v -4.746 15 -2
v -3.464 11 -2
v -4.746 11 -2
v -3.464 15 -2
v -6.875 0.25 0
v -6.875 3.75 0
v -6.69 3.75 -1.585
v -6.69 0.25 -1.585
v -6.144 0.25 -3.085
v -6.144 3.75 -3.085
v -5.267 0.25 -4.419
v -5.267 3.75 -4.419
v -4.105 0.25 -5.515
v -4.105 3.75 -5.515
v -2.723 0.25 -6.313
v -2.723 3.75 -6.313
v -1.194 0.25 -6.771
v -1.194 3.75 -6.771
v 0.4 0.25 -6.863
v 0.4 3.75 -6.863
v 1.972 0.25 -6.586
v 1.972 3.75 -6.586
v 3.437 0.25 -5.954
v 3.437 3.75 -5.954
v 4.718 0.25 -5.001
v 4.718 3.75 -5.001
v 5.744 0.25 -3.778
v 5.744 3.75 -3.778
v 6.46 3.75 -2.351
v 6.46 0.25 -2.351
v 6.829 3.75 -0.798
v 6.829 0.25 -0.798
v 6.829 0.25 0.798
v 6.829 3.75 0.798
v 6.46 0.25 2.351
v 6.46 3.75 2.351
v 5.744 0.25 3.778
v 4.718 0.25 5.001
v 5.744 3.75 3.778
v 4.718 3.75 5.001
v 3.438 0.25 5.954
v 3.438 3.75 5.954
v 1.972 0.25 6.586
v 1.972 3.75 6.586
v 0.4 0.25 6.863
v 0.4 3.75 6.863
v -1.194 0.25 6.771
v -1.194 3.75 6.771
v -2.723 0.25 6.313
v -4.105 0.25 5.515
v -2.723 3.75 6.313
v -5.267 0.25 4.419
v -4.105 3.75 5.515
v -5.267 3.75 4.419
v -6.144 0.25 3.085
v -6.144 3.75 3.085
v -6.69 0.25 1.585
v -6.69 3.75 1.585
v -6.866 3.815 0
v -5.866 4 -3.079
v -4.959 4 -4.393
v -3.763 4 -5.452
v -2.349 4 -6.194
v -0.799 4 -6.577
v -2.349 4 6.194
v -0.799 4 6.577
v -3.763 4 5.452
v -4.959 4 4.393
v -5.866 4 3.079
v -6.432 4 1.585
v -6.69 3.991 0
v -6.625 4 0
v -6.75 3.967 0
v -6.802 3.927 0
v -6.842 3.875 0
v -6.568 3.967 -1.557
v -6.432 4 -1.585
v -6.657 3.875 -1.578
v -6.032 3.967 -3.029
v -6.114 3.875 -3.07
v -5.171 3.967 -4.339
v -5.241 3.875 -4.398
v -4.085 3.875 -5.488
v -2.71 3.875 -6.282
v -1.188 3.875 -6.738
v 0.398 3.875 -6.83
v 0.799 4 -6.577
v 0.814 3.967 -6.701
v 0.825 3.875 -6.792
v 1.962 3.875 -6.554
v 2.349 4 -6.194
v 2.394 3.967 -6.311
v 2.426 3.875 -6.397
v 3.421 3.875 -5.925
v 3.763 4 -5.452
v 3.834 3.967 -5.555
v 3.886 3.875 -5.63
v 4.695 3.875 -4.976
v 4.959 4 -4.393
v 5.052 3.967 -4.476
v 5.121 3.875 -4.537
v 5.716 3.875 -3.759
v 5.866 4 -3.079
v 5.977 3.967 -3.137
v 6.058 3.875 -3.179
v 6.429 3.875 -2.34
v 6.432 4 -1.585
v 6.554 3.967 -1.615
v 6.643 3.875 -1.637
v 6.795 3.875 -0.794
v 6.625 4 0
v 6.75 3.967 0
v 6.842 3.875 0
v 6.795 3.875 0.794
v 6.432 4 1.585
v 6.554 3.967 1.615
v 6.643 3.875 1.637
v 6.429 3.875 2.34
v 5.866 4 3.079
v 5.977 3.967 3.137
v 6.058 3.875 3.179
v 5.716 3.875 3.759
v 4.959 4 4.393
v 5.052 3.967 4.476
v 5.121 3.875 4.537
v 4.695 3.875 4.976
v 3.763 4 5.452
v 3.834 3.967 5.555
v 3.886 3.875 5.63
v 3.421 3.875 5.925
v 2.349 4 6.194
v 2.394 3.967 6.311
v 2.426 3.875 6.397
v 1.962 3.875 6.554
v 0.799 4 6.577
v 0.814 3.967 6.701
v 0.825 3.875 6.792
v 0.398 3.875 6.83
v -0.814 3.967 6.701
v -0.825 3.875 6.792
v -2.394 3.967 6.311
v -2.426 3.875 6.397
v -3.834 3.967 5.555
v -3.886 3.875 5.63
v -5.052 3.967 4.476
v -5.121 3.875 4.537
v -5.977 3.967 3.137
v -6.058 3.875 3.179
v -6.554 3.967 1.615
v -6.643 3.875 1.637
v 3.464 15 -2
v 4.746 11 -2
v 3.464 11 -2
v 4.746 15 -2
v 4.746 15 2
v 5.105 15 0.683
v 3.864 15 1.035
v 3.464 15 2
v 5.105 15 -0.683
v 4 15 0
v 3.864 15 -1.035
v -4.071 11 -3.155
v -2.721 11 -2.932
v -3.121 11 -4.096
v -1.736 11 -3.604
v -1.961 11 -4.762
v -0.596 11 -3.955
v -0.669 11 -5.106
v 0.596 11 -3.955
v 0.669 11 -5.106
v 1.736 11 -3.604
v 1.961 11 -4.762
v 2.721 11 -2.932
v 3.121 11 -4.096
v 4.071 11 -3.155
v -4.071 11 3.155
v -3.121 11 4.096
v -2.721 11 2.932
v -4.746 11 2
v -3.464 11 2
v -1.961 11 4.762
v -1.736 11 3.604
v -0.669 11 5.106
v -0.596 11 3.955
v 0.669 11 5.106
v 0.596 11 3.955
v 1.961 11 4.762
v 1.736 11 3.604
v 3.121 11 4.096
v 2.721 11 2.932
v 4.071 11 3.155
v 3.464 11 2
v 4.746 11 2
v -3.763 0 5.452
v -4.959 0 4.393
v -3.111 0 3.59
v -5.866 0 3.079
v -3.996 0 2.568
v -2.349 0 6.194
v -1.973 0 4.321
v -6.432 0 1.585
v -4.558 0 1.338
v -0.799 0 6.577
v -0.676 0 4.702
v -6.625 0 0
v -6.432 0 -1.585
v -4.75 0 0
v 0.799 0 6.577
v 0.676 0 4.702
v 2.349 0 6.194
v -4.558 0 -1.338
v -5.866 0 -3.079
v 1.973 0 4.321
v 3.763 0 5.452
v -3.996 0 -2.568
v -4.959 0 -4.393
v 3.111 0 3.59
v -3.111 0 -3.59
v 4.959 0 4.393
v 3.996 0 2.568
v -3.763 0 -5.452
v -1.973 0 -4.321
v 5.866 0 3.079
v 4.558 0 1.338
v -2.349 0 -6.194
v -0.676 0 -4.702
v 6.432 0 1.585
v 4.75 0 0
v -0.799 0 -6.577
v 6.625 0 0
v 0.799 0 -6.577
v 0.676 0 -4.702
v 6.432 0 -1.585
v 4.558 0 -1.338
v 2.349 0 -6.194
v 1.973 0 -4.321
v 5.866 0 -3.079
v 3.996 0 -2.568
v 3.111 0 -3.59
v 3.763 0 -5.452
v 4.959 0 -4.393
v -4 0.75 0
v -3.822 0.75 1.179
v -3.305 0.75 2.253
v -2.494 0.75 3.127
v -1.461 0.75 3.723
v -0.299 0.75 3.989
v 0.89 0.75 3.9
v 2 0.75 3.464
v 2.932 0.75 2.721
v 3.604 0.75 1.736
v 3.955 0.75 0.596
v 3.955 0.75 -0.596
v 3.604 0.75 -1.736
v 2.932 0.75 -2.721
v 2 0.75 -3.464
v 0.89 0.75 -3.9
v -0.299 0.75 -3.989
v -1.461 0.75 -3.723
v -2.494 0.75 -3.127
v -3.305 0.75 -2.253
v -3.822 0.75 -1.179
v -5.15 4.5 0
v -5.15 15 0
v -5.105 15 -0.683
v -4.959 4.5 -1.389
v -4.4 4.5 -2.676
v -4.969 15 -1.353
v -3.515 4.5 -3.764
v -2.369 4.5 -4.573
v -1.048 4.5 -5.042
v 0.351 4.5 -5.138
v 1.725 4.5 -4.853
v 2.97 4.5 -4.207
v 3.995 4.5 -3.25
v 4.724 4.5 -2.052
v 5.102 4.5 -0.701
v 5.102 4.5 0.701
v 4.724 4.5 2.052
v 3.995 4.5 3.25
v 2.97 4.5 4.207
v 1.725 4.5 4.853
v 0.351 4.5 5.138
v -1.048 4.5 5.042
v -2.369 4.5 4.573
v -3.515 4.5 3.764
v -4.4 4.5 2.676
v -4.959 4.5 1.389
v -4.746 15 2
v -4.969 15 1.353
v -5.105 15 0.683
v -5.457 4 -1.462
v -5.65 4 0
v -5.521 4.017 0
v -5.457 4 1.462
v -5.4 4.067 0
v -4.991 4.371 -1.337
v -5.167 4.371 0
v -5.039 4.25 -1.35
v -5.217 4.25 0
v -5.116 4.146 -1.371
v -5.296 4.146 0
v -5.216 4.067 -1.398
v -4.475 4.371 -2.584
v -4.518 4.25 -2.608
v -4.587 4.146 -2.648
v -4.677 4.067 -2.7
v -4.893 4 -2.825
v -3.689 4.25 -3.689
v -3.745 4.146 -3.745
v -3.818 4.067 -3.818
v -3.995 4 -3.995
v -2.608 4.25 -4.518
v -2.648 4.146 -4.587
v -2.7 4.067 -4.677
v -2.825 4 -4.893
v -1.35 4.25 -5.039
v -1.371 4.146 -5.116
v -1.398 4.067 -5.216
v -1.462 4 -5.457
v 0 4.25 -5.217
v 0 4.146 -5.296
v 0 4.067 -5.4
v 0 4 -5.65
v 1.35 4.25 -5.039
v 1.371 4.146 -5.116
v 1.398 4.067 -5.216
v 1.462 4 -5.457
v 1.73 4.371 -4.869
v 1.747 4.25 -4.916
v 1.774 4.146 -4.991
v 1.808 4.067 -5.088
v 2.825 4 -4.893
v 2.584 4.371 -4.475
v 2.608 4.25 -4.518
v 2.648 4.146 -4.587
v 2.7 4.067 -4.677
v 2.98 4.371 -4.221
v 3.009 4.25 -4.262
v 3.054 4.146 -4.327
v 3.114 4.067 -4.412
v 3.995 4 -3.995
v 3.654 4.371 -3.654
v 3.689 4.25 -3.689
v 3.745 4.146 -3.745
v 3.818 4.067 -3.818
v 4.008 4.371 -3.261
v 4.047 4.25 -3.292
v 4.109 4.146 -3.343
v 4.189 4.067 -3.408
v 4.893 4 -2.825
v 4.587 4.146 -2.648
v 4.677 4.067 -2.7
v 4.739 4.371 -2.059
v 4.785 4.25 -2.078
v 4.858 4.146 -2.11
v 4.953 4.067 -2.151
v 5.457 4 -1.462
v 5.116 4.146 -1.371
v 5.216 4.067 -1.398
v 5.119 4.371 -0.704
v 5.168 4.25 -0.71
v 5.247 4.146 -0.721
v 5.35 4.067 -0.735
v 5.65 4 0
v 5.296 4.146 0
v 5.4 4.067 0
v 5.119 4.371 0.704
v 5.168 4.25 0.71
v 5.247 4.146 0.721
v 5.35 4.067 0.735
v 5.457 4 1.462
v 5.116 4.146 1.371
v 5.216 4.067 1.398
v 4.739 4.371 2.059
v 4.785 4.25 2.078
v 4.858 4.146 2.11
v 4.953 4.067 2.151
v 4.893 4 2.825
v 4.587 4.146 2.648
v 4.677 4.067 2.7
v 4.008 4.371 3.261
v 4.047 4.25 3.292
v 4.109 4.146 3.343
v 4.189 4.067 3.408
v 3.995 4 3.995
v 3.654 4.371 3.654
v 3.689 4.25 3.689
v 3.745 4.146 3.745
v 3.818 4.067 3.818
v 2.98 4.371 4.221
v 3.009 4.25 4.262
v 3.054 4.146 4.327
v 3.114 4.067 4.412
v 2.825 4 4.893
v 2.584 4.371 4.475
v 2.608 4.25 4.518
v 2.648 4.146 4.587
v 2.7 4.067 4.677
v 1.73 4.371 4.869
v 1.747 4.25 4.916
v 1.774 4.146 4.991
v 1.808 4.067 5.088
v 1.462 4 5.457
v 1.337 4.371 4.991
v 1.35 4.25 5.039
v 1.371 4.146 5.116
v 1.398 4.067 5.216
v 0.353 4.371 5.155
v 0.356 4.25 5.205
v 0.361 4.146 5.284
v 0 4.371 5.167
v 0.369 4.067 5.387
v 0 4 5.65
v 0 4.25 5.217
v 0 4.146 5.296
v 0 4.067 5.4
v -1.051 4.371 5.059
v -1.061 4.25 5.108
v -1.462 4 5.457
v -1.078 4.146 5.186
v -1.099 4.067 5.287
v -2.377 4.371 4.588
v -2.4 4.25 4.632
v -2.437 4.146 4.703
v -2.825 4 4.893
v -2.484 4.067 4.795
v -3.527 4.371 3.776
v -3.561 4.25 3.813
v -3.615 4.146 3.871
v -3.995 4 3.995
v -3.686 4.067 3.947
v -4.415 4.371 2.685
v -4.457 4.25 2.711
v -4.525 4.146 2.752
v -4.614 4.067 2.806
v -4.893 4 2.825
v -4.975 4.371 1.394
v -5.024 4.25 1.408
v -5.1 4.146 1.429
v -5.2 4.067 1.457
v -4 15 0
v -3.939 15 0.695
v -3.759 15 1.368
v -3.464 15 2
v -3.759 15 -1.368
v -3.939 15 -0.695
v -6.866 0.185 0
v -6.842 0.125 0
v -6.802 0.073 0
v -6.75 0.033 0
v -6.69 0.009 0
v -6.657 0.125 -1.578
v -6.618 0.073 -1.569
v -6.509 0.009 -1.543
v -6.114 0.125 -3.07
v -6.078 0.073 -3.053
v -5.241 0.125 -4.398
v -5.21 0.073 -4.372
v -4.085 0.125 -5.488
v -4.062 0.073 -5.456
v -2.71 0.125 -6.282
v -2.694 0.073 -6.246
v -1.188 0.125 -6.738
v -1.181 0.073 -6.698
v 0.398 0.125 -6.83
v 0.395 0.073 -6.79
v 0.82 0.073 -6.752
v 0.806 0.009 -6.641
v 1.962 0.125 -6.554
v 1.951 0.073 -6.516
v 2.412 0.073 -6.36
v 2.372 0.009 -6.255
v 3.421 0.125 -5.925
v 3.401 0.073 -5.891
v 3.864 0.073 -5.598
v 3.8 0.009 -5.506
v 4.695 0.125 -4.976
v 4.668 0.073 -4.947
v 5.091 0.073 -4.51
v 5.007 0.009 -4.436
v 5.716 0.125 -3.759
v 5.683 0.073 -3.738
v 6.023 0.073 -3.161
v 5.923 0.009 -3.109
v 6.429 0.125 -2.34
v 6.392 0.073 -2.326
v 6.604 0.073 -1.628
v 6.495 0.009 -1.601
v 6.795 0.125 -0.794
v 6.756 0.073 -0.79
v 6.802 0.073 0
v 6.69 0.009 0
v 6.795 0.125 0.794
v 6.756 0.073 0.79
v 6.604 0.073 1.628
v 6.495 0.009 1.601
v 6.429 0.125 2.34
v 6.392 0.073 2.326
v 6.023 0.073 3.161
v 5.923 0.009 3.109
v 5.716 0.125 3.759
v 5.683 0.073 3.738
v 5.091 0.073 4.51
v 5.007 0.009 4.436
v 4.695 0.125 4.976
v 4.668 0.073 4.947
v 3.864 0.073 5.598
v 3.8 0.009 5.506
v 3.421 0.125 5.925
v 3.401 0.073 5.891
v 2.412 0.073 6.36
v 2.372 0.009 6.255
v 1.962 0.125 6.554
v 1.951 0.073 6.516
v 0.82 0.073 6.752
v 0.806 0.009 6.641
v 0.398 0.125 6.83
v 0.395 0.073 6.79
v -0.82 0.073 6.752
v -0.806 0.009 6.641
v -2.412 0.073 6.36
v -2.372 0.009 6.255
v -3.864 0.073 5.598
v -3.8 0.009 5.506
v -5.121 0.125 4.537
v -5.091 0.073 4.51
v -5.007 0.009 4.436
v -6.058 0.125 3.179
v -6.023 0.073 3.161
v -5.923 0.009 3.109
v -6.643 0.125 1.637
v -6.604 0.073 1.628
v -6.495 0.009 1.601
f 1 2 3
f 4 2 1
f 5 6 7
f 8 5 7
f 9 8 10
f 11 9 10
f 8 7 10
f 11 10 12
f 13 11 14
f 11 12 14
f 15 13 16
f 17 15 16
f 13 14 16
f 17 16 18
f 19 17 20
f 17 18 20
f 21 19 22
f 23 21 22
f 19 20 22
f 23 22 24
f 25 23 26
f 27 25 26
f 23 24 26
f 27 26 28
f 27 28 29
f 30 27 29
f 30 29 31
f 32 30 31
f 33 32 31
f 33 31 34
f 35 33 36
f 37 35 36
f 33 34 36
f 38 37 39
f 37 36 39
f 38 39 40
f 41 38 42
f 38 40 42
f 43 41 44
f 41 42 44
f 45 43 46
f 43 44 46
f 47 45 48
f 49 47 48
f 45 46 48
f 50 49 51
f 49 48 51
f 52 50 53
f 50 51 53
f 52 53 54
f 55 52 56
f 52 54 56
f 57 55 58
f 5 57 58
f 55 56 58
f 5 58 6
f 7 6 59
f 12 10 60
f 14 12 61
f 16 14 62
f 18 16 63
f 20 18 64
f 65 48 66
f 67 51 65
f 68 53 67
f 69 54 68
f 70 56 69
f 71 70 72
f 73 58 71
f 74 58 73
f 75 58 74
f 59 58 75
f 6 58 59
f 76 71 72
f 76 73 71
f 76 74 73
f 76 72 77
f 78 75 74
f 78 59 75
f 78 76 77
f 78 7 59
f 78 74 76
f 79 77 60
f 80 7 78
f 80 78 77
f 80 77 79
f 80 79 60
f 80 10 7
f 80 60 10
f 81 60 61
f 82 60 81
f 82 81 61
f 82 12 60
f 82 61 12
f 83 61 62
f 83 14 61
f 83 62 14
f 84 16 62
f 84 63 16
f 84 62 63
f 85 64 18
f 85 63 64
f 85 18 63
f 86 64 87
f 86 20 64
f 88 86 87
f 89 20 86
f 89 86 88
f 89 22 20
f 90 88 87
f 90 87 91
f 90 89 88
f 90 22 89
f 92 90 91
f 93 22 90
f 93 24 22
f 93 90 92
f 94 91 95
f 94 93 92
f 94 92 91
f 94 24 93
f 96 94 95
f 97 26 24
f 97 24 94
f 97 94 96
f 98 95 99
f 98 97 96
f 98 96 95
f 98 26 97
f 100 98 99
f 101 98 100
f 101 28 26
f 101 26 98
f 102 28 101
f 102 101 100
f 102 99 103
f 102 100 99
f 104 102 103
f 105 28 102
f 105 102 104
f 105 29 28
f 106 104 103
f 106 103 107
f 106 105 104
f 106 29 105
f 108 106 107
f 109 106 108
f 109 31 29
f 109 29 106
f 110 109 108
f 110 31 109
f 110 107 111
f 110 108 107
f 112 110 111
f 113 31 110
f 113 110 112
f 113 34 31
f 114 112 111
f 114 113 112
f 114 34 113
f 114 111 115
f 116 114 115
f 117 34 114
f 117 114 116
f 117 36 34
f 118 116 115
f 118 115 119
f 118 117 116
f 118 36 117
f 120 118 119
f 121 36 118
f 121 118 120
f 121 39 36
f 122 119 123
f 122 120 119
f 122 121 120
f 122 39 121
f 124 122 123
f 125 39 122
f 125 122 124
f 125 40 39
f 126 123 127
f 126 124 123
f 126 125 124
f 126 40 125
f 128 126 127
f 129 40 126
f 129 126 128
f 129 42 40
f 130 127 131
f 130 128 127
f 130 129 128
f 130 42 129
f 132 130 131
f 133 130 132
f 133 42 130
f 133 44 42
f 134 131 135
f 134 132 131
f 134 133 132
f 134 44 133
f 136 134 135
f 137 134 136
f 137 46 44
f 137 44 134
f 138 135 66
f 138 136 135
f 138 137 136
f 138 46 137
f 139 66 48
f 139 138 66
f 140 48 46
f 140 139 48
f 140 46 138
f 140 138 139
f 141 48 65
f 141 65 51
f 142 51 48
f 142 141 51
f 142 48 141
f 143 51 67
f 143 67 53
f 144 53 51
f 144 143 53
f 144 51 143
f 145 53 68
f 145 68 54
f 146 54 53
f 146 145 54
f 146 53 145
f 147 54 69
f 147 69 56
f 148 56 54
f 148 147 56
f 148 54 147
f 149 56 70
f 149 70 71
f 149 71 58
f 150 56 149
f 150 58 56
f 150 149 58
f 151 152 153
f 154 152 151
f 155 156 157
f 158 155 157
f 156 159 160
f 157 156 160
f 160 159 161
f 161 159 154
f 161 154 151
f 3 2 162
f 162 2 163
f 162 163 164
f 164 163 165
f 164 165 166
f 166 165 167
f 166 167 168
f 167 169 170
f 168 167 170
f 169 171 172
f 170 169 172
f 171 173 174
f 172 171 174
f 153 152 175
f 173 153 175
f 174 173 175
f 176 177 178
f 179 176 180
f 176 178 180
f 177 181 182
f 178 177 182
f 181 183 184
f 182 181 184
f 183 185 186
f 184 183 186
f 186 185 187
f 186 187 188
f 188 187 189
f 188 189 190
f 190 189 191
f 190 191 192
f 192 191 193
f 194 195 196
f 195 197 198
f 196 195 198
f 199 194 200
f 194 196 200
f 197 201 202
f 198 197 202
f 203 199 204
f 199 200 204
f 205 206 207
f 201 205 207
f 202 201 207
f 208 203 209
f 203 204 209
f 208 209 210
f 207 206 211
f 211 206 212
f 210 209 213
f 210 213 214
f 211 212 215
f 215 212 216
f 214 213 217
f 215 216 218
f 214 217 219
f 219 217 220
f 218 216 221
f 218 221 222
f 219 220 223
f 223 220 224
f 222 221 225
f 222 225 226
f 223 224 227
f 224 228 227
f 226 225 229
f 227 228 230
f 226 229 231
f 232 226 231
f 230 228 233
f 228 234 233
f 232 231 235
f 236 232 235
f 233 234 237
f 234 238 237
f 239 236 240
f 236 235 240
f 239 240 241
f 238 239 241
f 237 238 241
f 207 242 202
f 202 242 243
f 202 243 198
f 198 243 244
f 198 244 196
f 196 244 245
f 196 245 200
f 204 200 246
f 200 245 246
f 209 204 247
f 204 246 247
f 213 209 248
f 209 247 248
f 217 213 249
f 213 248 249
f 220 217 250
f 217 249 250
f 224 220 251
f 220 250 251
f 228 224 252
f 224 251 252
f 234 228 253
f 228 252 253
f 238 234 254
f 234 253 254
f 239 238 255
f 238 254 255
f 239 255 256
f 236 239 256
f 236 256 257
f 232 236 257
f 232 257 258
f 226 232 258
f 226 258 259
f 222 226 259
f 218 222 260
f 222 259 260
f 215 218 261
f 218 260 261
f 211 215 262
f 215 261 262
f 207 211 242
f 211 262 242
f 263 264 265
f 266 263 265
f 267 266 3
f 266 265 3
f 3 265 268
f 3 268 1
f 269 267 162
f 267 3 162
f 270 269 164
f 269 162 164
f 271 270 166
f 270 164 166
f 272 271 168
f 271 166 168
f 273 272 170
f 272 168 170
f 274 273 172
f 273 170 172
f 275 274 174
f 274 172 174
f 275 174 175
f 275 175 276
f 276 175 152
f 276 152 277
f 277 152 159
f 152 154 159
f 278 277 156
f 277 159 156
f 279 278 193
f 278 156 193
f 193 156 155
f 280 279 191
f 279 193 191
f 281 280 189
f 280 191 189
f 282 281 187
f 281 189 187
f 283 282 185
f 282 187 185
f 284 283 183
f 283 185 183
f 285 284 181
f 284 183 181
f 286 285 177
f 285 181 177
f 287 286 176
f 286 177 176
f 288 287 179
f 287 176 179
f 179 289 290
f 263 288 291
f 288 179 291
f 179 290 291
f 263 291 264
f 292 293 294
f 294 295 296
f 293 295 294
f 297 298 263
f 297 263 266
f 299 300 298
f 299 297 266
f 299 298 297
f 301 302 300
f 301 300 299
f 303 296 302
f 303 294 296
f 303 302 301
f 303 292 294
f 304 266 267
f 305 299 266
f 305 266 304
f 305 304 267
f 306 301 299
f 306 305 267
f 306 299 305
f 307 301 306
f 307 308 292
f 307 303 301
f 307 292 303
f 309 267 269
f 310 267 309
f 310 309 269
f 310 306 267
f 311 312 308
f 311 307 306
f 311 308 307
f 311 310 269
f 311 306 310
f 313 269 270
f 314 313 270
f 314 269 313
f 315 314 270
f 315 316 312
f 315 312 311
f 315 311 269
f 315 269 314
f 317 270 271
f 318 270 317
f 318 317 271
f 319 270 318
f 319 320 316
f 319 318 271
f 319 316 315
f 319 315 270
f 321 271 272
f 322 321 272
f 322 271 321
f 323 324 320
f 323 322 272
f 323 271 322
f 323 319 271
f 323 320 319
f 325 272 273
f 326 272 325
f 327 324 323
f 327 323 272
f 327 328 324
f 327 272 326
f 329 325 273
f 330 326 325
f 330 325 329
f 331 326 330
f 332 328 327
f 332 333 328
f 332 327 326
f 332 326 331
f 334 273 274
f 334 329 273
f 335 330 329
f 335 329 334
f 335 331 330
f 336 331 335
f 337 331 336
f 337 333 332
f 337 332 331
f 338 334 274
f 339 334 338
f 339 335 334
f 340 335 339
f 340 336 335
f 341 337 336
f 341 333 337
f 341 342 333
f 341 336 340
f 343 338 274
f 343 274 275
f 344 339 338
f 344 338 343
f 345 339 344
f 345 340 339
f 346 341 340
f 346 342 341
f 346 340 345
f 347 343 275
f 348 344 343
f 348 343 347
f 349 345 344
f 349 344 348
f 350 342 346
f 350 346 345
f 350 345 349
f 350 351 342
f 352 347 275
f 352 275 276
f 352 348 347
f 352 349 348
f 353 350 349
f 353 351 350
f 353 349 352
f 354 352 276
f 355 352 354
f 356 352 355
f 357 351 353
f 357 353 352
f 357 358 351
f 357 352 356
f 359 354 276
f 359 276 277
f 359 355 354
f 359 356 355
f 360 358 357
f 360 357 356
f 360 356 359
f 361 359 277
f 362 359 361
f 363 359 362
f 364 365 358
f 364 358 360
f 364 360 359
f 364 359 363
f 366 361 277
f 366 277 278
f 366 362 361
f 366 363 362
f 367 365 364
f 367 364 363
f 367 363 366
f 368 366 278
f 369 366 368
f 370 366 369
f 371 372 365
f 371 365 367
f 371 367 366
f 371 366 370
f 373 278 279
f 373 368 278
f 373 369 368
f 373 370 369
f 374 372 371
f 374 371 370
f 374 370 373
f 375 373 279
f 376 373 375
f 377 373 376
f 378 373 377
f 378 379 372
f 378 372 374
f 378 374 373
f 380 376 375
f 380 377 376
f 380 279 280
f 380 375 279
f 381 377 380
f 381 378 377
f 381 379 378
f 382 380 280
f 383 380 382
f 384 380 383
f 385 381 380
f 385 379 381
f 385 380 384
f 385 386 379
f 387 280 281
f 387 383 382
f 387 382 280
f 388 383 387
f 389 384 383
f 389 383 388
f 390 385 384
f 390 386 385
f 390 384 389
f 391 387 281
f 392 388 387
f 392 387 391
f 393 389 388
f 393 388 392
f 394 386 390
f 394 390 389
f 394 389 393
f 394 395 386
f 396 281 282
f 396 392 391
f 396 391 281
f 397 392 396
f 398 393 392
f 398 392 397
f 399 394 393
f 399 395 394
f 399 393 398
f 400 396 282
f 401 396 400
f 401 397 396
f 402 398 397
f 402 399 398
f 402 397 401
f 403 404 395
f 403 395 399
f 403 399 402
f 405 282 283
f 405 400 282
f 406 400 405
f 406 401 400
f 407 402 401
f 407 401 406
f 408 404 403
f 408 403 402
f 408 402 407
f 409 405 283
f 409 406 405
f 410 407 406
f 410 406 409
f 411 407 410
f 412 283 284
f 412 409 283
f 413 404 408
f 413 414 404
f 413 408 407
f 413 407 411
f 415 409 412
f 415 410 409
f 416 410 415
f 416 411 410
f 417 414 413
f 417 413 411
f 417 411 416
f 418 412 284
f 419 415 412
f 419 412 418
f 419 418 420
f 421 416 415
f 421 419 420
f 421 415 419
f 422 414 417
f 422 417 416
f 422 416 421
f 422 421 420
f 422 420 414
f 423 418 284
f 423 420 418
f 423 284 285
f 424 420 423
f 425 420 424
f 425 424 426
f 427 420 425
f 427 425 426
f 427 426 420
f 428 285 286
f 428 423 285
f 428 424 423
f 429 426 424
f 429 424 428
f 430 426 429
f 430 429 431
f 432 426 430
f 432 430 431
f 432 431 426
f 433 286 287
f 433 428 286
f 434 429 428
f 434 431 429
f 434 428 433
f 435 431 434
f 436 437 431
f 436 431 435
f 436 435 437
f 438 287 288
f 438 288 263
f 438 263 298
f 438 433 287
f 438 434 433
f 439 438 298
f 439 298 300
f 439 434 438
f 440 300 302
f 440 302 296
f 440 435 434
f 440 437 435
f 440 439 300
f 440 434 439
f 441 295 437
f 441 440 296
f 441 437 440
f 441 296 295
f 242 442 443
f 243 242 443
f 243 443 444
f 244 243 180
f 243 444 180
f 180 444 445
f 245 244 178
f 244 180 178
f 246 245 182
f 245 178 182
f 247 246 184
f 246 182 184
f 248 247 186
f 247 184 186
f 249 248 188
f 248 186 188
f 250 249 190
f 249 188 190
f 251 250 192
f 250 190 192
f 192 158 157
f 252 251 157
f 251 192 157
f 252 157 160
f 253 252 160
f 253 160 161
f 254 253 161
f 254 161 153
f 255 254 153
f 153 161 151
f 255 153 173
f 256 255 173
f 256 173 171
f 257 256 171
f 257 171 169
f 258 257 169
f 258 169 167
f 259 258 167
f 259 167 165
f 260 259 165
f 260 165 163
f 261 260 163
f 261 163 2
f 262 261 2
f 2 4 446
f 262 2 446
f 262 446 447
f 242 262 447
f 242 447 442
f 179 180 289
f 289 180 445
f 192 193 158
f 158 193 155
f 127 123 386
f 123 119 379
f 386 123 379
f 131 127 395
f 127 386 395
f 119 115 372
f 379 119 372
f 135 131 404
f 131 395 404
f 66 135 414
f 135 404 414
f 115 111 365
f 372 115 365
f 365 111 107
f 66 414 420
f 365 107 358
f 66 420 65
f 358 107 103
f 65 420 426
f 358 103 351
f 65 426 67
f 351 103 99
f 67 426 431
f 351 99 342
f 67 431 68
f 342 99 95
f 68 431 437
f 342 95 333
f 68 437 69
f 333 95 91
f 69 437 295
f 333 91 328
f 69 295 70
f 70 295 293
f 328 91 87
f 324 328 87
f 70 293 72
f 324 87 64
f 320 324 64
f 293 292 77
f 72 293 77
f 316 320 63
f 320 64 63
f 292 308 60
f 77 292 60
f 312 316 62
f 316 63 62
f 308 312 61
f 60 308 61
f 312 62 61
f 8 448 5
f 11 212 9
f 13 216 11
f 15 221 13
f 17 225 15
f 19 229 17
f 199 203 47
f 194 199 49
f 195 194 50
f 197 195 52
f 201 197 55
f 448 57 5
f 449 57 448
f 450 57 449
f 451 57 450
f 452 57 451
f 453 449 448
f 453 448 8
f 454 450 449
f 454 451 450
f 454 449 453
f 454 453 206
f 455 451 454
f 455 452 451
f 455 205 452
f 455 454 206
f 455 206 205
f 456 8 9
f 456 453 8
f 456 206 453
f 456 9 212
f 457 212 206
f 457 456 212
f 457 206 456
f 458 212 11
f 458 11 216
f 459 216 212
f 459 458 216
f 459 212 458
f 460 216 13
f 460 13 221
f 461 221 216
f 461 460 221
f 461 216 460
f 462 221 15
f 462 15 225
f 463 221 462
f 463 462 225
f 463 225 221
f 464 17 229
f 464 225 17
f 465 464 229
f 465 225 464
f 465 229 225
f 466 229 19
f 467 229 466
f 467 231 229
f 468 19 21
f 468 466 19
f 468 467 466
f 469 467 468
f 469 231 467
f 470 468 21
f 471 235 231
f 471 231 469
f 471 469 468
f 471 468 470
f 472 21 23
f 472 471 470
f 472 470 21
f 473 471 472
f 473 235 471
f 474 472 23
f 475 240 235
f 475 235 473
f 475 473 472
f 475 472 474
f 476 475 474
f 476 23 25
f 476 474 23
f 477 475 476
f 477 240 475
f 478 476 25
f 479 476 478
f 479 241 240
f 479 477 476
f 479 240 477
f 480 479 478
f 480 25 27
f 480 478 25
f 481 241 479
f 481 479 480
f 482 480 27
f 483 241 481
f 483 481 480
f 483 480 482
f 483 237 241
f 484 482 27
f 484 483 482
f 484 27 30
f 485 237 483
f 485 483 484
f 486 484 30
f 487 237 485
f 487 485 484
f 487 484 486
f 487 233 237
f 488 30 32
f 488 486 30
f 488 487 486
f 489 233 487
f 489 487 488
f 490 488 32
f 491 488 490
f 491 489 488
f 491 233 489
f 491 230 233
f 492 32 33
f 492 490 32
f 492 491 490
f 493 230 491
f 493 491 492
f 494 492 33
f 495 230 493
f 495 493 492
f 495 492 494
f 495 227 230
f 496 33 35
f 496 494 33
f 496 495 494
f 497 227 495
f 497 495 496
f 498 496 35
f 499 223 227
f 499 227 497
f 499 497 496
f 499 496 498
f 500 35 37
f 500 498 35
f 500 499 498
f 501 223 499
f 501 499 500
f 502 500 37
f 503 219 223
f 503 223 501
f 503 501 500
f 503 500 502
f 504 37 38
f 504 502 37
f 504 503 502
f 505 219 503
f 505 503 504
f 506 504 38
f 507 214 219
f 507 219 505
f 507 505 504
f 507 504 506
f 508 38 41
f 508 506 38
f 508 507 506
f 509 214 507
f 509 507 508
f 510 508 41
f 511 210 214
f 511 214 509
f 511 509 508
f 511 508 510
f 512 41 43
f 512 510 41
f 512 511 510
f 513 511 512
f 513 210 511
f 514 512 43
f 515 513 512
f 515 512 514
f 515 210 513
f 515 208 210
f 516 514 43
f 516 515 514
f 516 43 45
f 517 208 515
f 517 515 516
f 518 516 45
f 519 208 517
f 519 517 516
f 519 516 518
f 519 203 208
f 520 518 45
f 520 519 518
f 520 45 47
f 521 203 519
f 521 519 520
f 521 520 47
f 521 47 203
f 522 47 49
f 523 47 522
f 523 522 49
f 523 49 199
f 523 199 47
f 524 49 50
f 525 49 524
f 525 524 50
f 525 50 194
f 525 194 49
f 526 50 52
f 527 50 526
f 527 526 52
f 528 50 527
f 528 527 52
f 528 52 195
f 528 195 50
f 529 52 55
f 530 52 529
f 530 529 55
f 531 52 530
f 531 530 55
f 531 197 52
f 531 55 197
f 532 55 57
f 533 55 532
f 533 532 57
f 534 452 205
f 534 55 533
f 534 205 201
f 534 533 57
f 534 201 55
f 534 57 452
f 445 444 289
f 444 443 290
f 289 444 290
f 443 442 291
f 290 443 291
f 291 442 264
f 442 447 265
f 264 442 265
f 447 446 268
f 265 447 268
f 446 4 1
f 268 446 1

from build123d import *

# Parameters (mm, degrees)
SKETCH2_R          = 4
CUT_EXTRUDE1_DEPTH = 18.875437058
SKETCH3_W          = 3.15
SKETCH3_H          = 4
CUT_EXTRUDE2_DEPTH = 21.417302711
FILLET1_R          = 0.5
FILLET2_R          = 0.25
CHAMFER1_SIZE      = 0.75


with BuildPart() as part:
    # Sketch1 → Revolve1 (revolve)
    with BuildSketch(Plane.XY):
        Polygon((0, 0), (-6.875, 0), (-6.875, 4), (-5.15, 4), (-5.15, 15), (0, 15), align=None)
    revolve(axis=Axis((0, 15, 0), (0, -1, 0)))

    # Sketch2 → Cut-Extrude1 (cut, through all)
    with BuildSketch(Plane(origin=(0, 15, 0), x_dir=(1, 0, 0), z_dir=(0, 1, 0))):
        with Locations(Location((0, 0, 0), (0, 0, 180))):
            Circle(SKETCH2_R)
    extrude(amount=-CUT_EXTRUDE1_DEPTH, mode=Mode.SUBTRACT)

    # Sketch3 → Cut-Extrude2 (cut, through all)
    with BuildSketch(Plane(origin=(5.15, 0, 0), x_dir=(0, 0, -1), z_dir=(1, 0, 0))):
        with Locations((-3.575, 13)):
            Rectangle(SKETCH3_W, SKETCH3_H)
        with Locations((3.575, 13)):
            Rectangle(SKETCH3_W, SKETCH3_H)
    extrude(amount=-CUT_EXTRUDE2_DEPTH, mode=Mode.SUBTRACT)

    # Fillet1
    fillet1_edges = [part.edges().sort_by_distance(p)[0] for p in [
        (5.15, 4, 0),
    ]]
    fillet(fillet1_edges, radius=FILLET1_R)

    # Fillet2
    fillet2_edges = [part.edges().sort_by_distance(p)[0] for p in [
        (6.875, 4, 0),
        (6.875, 0, 0),
    ]]
    fillet(fillet2_edges, radius=FILLET2_R)

    # Chamfer1
    chamfer1_edges = [part.edges().sort_by_distance(p)[0] for p in [
        (4, 0, 0),
    ]]
    chamfer(chamfer1_edges, length=CHAMFER1_SIZE)


solid = part.part
